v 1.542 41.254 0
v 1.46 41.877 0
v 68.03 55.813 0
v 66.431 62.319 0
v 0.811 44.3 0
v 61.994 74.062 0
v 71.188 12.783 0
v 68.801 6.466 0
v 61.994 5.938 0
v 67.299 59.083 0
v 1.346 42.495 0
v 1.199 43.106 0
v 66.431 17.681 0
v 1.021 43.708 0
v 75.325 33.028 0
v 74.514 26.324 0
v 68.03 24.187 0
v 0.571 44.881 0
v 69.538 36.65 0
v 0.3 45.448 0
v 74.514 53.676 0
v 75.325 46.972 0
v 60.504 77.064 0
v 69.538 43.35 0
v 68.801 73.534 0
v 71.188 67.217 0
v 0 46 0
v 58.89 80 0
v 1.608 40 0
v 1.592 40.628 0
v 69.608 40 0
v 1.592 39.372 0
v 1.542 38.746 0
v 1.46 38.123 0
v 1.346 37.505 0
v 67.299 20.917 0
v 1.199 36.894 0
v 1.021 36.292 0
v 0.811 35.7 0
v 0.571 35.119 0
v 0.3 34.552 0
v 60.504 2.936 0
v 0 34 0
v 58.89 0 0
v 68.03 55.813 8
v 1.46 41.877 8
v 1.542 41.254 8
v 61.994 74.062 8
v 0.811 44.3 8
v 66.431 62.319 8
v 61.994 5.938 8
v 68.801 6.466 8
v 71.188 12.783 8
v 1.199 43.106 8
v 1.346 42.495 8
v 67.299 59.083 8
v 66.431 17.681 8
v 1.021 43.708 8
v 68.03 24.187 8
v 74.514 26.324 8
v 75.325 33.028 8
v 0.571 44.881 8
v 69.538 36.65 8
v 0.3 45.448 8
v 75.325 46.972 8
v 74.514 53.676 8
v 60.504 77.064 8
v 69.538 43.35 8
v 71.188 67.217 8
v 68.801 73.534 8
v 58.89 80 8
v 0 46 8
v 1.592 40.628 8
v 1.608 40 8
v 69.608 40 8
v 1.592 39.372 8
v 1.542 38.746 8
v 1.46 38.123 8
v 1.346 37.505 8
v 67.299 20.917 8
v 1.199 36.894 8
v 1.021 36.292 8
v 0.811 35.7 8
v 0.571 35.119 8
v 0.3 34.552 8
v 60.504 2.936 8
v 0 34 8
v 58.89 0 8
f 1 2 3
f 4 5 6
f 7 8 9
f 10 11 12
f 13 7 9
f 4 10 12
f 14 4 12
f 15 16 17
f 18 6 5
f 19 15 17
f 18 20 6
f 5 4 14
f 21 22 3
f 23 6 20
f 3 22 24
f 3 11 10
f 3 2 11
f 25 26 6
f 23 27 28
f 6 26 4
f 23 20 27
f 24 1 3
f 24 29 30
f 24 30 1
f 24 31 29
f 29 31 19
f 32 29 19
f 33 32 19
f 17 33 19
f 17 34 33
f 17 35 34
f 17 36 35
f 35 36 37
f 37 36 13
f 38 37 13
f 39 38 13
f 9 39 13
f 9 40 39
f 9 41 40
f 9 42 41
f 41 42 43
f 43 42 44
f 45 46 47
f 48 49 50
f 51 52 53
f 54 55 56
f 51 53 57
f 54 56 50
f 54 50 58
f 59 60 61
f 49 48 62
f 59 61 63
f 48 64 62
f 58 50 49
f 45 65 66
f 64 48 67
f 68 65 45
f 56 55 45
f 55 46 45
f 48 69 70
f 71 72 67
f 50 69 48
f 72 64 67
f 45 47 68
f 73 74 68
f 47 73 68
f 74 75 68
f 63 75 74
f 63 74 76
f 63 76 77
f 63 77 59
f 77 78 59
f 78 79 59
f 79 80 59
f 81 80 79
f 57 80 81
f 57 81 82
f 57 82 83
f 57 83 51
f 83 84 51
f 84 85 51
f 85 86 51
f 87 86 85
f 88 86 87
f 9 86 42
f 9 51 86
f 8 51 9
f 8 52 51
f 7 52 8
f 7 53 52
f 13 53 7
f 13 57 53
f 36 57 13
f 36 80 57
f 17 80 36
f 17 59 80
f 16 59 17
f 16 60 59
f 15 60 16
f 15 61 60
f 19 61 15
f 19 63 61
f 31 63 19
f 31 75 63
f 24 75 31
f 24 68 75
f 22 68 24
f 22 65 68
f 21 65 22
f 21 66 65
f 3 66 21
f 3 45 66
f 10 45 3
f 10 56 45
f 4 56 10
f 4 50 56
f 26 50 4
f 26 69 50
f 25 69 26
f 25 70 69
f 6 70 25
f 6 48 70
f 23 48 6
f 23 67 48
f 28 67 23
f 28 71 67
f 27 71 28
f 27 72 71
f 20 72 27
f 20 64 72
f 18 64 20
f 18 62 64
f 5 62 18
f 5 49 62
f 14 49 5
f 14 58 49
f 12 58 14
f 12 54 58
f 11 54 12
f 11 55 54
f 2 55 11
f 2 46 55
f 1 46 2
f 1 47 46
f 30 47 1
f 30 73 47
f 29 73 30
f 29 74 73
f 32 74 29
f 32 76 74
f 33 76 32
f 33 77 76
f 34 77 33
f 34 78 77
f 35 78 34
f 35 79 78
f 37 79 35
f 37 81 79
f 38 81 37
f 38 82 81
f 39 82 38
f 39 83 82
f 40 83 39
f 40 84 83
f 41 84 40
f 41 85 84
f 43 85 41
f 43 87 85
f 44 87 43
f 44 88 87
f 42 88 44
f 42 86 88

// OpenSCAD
$fn = 32;

// ----------------------------------------------------------------------
// Gear sector: 4 teeth on 60 degrees
// ----------------------------------------------------------------------

// --- parameters (mm) ---
sector_angle = 60;        // sector angle, degrees
root_r = 80;              // root circle radius
tooth_h = 6;              // tooth height over the root circle
teeth = 4;                // number of teeth on the sector
hub_r = 12;               // hub bore radius
plate_t = 8;              // sector thickness, Z
arc_step = 3;             // sampling step of the root/hub arcs, degrees
fit_tol = 0.05;           // declared fit tolerance (prompt contract)
free_tol = 0.2;           // declared free tolerance (prompt contract)

tip_r = root_r + tooth_h;  // tip circle radius

profile = [[58.89, 0], [60.504, 2.936], [61.994, 5.938], [68.801, 6.466], [71.188, 12.783], [66.431, 17.681], [67.299, 20.917], [68.03, 24.187], [74.514, 26.324], [75.325, 33.028], [69.538, 36.65], [69.608, 40], [69.538, 43.35], [75.325, 46.972], [74.514, 53.676], [68.03, 55.813], [67.299, 59.083], [66.431, 62.319], [71.188, 67.217], [68.801, 73.534], [61.994, 74.062], [60.504, 77.064], [58.89, 80], [0, 46], [0.3, 45.448], [0.571, 44.881], [0.811, 44.3], [1.021, 43.708], [1.199, 43.106], [1.346, 42.495], [1.46, 41.877], [1.542, 41.254], [1.592, 40.628], [1.608, 40], [1.592, 39.372], [1.542, 38.746], [1.46, 38.123], [1.346, 37.505], [1.199, 36.894], [1.021, 36.292], [0.811, 35.7], [0.571, 35.119], [0.3, 34.552], [0, 34]];  // primary outline, 44 points, counter clockwise

// --- the one profile operation ---
linear_extrude(height = plate_t) polygon(points = profile);
